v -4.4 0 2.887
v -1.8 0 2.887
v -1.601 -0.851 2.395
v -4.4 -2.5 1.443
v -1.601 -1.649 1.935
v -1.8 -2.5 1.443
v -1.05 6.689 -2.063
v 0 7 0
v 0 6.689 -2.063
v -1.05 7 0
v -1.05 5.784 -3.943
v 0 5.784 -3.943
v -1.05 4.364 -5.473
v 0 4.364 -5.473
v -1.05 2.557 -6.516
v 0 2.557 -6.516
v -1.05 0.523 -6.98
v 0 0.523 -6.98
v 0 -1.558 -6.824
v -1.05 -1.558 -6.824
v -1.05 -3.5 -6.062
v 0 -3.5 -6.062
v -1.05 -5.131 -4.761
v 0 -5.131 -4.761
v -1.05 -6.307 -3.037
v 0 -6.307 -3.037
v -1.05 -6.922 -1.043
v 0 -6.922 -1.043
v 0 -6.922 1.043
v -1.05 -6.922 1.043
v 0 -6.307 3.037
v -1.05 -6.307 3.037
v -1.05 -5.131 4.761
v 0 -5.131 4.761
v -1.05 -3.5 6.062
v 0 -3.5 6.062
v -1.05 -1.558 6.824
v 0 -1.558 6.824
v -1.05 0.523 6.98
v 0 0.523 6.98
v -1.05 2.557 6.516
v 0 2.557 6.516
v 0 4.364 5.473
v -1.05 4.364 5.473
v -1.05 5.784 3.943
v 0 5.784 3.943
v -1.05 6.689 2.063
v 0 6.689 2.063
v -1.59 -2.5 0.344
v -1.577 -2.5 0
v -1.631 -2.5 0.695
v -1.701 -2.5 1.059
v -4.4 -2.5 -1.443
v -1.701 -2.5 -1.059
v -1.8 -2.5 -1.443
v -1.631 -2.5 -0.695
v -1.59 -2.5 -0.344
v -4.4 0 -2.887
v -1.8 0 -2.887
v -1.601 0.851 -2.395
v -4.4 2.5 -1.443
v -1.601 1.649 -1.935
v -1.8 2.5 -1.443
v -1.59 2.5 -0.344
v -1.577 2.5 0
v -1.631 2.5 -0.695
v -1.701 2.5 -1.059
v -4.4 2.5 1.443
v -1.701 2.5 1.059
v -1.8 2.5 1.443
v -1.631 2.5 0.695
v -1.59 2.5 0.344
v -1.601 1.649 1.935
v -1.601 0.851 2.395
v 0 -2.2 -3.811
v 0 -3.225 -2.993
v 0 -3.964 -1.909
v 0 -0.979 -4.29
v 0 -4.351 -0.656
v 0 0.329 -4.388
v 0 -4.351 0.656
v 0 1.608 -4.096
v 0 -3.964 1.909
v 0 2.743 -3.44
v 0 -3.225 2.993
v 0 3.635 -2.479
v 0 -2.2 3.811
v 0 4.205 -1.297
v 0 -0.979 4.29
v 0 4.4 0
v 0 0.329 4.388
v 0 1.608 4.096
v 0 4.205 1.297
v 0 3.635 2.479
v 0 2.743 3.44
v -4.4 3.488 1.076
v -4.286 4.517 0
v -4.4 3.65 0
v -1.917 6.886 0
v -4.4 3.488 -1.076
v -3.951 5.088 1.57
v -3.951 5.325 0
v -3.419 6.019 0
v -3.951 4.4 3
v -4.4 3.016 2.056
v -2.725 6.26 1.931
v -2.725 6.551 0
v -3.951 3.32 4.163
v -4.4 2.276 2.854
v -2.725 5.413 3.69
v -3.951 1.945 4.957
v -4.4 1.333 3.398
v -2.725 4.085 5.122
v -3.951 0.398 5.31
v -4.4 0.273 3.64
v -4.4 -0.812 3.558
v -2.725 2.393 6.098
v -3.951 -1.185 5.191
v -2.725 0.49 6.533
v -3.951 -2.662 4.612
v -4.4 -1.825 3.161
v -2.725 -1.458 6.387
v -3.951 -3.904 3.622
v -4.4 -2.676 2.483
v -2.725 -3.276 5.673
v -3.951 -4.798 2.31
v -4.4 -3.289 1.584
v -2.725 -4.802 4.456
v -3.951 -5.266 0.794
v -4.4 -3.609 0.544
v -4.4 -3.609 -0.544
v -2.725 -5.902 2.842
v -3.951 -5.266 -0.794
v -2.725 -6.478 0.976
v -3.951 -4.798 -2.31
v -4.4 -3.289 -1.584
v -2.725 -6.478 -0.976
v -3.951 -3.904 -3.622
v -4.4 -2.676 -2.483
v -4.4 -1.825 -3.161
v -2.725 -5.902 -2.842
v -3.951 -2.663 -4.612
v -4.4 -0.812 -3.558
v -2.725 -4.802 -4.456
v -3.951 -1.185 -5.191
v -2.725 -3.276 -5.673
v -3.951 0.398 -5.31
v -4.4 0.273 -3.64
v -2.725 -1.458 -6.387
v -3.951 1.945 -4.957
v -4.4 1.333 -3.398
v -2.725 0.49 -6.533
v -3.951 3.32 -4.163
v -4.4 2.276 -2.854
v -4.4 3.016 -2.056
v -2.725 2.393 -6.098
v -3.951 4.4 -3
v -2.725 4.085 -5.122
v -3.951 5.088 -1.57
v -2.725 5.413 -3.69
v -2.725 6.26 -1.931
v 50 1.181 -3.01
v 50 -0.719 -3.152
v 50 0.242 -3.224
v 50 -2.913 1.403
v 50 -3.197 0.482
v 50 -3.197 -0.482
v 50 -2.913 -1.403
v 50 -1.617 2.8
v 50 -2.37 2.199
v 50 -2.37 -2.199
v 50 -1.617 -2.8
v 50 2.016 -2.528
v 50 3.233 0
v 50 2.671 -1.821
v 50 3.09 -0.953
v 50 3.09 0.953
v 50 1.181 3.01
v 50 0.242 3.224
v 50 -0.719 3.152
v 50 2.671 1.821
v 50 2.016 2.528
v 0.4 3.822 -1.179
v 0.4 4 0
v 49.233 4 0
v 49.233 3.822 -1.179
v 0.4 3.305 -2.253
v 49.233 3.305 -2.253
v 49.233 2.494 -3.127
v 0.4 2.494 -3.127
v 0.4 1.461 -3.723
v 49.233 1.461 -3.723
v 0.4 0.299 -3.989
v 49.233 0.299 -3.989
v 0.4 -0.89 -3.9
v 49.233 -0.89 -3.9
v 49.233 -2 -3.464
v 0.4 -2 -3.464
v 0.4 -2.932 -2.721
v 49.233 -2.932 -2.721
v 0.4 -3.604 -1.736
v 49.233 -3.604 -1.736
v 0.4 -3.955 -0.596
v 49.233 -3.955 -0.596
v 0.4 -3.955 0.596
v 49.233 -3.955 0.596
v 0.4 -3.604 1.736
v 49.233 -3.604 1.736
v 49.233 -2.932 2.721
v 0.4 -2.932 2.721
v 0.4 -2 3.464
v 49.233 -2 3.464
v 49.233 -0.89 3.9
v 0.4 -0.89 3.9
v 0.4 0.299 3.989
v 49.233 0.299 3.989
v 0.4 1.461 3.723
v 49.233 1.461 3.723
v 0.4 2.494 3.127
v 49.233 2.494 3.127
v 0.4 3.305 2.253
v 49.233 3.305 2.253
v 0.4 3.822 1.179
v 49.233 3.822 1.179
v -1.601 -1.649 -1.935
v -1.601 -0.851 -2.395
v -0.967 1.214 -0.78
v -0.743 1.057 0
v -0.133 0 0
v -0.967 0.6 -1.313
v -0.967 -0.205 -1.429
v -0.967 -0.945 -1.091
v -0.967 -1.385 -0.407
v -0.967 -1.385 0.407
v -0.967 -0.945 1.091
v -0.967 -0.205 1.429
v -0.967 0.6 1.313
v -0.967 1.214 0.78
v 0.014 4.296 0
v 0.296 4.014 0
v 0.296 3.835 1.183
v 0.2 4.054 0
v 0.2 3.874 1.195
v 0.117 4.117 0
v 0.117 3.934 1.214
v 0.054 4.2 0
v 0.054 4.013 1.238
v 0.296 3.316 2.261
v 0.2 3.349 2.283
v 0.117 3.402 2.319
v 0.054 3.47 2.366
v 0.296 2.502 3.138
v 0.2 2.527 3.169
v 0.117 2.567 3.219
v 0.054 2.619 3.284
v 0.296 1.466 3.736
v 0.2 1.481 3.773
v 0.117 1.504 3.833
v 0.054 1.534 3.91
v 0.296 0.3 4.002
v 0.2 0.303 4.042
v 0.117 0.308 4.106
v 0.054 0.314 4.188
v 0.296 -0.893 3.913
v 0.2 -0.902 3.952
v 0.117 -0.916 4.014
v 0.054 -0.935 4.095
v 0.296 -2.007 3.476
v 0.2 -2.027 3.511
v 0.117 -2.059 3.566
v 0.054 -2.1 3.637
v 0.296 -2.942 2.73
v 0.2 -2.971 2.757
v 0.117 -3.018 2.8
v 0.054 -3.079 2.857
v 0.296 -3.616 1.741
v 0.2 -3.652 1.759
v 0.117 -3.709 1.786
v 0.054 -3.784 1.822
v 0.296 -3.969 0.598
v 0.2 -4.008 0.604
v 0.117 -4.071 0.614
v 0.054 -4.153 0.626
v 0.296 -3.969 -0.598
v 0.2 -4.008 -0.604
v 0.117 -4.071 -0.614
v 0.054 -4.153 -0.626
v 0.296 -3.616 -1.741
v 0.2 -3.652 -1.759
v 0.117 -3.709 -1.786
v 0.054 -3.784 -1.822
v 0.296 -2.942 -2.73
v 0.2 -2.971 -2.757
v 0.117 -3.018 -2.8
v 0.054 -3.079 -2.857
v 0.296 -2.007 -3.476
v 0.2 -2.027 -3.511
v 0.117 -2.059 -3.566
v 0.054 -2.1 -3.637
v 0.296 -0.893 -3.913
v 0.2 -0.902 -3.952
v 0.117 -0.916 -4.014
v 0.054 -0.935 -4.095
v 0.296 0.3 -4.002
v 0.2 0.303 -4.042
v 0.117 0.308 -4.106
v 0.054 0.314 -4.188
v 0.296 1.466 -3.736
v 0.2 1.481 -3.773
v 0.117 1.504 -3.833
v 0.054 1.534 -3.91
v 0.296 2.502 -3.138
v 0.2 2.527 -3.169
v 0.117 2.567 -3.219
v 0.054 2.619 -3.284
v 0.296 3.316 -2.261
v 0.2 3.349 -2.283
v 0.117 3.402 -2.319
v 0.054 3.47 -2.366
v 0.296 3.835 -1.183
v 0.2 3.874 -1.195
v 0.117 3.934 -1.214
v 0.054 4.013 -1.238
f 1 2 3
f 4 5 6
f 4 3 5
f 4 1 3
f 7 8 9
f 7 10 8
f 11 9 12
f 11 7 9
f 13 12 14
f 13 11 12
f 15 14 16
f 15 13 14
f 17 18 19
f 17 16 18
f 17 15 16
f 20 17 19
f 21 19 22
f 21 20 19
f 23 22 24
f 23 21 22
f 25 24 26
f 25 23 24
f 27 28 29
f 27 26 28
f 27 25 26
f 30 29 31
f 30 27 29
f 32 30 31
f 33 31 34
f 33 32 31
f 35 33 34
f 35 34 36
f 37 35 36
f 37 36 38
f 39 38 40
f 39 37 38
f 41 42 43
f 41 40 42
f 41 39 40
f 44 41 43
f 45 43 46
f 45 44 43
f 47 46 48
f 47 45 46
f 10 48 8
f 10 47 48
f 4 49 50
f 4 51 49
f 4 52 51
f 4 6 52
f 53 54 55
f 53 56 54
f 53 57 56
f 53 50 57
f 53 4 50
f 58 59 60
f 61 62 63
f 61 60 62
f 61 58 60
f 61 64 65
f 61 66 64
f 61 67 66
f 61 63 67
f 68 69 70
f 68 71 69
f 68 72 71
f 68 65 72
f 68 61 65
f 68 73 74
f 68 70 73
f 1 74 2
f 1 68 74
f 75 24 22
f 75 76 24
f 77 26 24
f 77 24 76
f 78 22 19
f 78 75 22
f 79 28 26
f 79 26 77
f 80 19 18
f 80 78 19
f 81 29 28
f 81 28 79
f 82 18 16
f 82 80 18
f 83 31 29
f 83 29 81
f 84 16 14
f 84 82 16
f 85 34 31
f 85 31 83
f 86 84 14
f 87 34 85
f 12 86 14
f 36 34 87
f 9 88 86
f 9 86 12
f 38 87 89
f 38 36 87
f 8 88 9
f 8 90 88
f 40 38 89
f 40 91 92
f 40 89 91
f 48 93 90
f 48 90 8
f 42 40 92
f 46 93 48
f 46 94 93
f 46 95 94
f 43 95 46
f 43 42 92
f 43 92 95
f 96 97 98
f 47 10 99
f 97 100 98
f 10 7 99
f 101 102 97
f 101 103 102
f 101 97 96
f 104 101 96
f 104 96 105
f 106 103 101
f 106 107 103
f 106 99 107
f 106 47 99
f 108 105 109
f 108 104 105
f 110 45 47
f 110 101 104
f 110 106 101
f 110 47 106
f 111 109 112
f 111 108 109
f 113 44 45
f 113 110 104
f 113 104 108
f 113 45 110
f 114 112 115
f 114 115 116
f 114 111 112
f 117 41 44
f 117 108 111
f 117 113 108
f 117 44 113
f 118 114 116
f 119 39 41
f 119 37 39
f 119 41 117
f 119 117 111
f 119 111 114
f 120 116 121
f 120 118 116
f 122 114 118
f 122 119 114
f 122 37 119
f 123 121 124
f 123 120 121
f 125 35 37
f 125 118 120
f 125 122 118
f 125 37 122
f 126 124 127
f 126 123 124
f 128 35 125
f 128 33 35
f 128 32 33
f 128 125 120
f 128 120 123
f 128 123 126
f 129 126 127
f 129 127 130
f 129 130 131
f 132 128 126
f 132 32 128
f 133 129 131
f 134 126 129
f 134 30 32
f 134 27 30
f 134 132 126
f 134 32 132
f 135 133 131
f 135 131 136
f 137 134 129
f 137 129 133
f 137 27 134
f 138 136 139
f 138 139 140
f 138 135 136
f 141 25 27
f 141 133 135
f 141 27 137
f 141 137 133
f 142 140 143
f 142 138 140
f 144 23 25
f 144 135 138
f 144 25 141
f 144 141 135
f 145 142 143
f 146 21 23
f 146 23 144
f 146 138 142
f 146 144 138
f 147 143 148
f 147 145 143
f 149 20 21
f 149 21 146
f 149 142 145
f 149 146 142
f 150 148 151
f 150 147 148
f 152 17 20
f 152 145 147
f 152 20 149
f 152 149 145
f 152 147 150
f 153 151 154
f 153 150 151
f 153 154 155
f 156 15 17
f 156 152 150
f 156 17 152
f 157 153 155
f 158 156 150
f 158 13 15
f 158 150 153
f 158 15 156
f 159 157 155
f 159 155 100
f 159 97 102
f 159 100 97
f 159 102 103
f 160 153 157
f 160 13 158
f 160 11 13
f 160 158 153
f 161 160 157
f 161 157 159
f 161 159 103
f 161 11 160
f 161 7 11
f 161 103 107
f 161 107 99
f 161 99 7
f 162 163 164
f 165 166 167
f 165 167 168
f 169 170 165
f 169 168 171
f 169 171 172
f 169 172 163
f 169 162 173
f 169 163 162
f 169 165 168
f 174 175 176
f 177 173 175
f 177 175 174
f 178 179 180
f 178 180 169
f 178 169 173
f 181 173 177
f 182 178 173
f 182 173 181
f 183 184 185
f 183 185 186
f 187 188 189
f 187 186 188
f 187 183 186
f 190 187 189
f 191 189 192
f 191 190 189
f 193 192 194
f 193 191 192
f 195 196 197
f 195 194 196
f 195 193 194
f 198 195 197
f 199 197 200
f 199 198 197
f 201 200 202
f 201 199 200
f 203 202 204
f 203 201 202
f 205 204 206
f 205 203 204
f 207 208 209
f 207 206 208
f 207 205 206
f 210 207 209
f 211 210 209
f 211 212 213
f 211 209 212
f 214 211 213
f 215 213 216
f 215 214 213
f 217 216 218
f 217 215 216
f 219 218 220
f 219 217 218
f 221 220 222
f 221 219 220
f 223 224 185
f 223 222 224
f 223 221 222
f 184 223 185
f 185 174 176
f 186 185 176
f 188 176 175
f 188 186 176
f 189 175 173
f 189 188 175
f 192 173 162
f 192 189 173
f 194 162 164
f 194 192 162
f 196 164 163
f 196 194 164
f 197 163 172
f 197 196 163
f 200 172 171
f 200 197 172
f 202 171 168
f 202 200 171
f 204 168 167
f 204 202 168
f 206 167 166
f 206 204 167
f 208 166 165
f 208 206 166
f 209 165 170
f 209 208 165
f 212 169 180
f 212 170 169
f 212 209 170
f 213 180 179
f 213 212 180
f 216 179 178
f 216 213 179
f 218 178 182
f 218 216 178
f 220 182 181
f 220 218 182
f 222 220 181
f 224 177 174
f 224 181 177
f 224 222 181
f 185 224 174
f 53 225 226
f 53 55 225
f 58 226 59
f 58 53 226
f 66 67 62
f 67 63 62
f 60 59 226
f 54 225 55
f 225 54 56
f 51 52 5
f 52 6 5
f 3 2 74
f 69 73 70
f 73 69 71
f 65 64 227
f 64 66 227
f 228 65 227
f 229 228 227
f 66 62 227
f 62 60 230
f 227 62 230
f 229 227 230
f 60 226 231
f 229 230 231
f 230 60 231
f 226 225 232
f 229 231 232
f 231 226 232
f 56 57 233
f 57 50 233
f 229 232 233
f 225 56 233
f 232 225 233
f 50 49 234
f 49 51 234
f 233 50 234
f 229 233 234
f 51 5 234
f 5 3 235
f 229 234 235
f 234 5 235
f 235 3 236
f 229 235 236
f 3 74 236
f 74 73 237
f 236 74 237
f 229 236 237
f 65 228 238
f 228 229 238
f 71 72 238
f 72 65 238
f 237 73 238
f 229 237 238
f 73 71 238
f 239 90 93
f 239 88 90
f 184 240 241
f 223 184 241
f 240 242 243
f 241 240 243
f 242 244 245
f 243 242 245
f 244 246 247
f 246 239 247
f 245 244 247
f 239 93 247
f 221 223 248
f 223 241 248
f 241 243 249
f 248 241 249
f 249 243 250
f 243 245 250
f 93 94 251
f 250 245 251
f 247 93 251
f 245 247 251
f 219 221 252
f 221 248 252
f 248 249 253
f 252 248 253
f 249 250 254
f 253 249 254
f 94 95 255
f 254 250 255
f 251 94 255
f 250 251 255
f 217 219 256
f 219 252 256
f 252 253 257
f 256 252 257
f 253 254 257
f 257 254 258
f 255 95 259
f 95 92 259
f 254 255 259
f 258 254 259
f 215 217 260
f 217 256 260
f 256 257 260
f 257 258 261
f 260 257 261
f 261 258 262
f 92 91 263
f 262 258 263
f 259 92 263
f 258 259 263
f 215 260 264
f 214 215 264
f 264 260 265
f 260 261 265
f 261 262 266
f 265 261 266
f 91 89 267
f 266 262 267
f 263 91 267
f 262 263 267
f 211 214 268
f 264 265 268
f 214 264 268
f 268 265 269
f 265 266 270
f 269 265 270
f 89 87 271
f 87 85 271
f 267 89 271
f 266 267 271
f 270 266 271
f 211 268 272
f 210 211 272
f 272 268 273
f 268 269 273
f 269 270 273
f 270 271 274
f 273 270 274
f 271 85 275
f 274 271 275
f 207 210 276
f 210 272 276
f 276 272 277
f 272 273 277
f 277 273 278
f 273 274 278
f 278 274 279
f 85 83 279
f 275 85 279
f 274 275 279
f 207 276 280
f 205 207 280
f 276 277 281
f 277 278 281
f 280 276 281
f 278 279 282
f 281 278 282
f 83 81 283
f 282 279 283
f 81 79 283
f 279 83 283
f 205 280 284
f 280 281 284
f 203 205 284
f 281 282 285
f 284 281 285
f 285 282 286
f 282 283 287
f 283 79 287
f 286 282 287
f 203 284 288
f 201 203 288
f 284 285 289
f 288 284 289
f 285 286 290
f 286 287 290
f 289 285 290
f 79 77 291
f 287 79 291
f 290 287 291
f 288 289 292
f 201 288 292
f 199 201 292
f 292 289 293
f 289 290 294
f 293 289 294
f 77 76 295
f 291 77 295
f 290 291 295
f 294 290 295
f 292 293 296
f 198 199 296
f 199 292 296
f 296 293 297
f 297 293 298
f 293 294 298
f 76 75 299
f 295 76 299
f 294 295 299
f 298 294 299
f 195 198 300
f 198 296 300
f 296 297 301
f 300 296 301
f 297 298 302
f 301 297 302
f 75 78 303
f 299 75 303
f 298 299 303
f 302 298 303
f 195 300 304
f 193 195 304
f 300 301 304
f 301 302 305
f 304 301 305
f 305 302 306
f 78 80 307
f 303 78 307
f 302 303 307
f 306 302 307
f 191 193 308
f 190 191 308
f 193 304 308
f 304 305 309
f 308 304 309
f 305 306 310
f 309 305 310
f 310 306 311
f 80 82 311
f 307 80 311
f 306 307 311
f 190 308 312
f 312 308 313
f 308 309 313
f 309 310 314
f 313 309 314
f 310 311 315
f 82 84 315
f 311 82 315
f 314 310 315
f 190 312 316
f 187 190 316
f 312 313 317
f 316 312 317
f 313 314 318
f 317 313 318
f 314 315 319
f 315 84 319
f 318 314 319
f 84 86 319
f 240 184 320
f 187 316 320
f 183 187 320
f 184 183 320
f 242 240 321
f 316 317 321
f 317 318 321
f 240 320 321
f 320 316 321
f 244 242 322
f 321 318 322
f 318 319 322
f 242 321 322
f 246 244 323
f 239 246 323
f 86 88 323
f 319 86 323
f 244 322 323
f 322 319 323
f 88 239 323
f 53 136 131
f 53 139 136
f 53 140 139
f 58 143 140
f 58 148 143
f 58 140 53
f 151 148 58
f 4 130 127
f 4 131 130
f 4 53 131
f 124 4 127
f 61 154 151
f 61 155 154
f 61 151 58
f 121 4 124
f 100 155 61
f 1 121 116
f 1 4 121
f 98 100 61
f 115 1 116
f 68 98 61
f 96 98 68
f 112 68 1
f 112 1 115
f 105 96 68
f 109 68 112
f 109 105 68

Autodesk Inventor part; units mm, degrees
ref_plane "YZ Plane" through (0, 0, 0) normal (1, 0, 0) x (0, 1, 0)
ref_plane "XZ Plane" through (0, 0, 0) normal (0, 1, 0) x (-1, 0, 0)
sketch "Sketch1" plane through (0, 0, 0) normal (0, 0, 1) x (1, 0, 0)
  line L0 (-0.1333, 0) -> (50, 0)
  line L1 (50, 0) -> (50, 4)
  line L2 (50, 4) -> (22, 4)
  line L3 (22, 4) -> (21.2331, 4)
  line L4 (21.2331, 4) -> (0, 4)
  line L5 (0, 4) -> (0, 7)
  line L6 (0, 7) -> (-4.4, 7)
  line L7 (-4.4, 7) -> (-4.4, 2.8868)
  line L8 (-4.4, 2.8868) -> (-1.8, 2.8868)
  line L9 (-1.8, 2.8868) -> (-0.1333, 0)
  line L10 (-15.28, 0) -> (60.88, 0) projected
  line L11 (0, -1.4) -> (0, 8.4) projected
  line L12 (22, 4) -> (0, 4) construction
  dimension "d1" = 28
  dimension "d2" = 0.7669
  dimension "d3" = 4.4
  dimension "d4" = 2.6
  dimension "d5" = 60
  dimension "d6" = 8
  dimension "d7" = 8
  dimension "d8" = 5.7735
  dimension "d9" = 14
  dimension "d26" = 50
revolve "Body" add sketch "Sketch1" angle 360 about axis through (-0.1333, 0, 0) along (1, 0, 0)
sketch "Sketch2" plane through (-4.4, 0, 0) normal (-1, 0, 0) x (0, 0, 1)
  circle A0 centre (0, 0) radius 2.8868 projected
  line L0 (0, -9.8) -> (0, 9.8) projected
  line L1 (-9.8, 0) -> (9.8, 0) projected
  line L2 (2.8868, 0) -> (1.4434, -2.5)
  line L3 (1.4434, -2.5) -> (-1.4434, -2.5)
  line L4 (-1.4434, -2.5) -> (-2.8868, 0)
  line L5 (-2.8868, 0) -> (-1.4434, 2.5)
  line L6 (-1.4434, 2.5) -> (1.4434, 2.5)
  line L7 (1.4434, 2.5) -> (2.8868, 0)
extrude "Slot" add sketch "Sketch2" against normal up to next contours L7 A0 | A0 L2 | L6 L0 A0 | A0 L0 L3 | L0 L6 A0 | A0 L3 L0 | L4 A0 | A0 L5
fillet "Fillet1" radius 3.35 1 edges at (-4.4, -7, 0)
thread "Thread" size "M8x1.25" class "6g" standard "ISO Metric profile" length 28
chamfer "Chamfer1" distance 0.7668 distance2 0.7668 1 edges at (50, -4, 0) measured on face at (50, -0.3588, -0.308)
ref_plane "Work Plane1" through (29, 0, 0) normal (0, -1, 0) x (1, 0, 0)
fillet "Fillet2" radius 0.4 1 edges at (0, -4, 0)
equation "\"d1\" = GEL"
equation "\"d3\" = KOH"
equation "\"d4\" = INTI"
equation "\"d6\" = GD"
equation "\"d7\" = BDM"
equation "\"d8\" = 1.1547 * SW"
equation "\"d9\" = KOD"
equation "\"d26\" = NLG"
equation "\"d30\" = R"
equation "\"d17\" = RR"
equation "\"d13\" = GEL"
equation "\"d15\" = -0.5 * SPD + 0.5 * GD"
equation "\"d16\" = GUL"
equation "\"GD\" = NND"
equation "\"NLG\" = 50"
equation "\"GEL\" = 28"
equation "\"KOD\" = 14"
equation "\"KOH\" = 4.4"
equation "\"INTI\" = 2.6"
equation "\"GAL\" = 0.61345 * PTC"
equation "\"GUL\" = 0.61345 * PTC"
equation "\"BDM\" = NND"
equation "\"SW\" = 5"
equation "\"RR\" = 3.35"
equation "\"SPD\" = NND - 1.2269 * PTC"
equation "\"R\" = 0.4"
equation "\"TOA\" = 30deg"
equation "\"GD1\" = THREADDIA - 1.2269 * PTC"
equation "\"THREADDIA\" = 8"
equation "\"PTC\" = 1.25"
equation "\"NND\" = 8"
equation "\"KOH1\" = 1.05"
equation "\"E0\" = 5.723"
properties part number "PWTR-0132" material "Stainless Steel"
